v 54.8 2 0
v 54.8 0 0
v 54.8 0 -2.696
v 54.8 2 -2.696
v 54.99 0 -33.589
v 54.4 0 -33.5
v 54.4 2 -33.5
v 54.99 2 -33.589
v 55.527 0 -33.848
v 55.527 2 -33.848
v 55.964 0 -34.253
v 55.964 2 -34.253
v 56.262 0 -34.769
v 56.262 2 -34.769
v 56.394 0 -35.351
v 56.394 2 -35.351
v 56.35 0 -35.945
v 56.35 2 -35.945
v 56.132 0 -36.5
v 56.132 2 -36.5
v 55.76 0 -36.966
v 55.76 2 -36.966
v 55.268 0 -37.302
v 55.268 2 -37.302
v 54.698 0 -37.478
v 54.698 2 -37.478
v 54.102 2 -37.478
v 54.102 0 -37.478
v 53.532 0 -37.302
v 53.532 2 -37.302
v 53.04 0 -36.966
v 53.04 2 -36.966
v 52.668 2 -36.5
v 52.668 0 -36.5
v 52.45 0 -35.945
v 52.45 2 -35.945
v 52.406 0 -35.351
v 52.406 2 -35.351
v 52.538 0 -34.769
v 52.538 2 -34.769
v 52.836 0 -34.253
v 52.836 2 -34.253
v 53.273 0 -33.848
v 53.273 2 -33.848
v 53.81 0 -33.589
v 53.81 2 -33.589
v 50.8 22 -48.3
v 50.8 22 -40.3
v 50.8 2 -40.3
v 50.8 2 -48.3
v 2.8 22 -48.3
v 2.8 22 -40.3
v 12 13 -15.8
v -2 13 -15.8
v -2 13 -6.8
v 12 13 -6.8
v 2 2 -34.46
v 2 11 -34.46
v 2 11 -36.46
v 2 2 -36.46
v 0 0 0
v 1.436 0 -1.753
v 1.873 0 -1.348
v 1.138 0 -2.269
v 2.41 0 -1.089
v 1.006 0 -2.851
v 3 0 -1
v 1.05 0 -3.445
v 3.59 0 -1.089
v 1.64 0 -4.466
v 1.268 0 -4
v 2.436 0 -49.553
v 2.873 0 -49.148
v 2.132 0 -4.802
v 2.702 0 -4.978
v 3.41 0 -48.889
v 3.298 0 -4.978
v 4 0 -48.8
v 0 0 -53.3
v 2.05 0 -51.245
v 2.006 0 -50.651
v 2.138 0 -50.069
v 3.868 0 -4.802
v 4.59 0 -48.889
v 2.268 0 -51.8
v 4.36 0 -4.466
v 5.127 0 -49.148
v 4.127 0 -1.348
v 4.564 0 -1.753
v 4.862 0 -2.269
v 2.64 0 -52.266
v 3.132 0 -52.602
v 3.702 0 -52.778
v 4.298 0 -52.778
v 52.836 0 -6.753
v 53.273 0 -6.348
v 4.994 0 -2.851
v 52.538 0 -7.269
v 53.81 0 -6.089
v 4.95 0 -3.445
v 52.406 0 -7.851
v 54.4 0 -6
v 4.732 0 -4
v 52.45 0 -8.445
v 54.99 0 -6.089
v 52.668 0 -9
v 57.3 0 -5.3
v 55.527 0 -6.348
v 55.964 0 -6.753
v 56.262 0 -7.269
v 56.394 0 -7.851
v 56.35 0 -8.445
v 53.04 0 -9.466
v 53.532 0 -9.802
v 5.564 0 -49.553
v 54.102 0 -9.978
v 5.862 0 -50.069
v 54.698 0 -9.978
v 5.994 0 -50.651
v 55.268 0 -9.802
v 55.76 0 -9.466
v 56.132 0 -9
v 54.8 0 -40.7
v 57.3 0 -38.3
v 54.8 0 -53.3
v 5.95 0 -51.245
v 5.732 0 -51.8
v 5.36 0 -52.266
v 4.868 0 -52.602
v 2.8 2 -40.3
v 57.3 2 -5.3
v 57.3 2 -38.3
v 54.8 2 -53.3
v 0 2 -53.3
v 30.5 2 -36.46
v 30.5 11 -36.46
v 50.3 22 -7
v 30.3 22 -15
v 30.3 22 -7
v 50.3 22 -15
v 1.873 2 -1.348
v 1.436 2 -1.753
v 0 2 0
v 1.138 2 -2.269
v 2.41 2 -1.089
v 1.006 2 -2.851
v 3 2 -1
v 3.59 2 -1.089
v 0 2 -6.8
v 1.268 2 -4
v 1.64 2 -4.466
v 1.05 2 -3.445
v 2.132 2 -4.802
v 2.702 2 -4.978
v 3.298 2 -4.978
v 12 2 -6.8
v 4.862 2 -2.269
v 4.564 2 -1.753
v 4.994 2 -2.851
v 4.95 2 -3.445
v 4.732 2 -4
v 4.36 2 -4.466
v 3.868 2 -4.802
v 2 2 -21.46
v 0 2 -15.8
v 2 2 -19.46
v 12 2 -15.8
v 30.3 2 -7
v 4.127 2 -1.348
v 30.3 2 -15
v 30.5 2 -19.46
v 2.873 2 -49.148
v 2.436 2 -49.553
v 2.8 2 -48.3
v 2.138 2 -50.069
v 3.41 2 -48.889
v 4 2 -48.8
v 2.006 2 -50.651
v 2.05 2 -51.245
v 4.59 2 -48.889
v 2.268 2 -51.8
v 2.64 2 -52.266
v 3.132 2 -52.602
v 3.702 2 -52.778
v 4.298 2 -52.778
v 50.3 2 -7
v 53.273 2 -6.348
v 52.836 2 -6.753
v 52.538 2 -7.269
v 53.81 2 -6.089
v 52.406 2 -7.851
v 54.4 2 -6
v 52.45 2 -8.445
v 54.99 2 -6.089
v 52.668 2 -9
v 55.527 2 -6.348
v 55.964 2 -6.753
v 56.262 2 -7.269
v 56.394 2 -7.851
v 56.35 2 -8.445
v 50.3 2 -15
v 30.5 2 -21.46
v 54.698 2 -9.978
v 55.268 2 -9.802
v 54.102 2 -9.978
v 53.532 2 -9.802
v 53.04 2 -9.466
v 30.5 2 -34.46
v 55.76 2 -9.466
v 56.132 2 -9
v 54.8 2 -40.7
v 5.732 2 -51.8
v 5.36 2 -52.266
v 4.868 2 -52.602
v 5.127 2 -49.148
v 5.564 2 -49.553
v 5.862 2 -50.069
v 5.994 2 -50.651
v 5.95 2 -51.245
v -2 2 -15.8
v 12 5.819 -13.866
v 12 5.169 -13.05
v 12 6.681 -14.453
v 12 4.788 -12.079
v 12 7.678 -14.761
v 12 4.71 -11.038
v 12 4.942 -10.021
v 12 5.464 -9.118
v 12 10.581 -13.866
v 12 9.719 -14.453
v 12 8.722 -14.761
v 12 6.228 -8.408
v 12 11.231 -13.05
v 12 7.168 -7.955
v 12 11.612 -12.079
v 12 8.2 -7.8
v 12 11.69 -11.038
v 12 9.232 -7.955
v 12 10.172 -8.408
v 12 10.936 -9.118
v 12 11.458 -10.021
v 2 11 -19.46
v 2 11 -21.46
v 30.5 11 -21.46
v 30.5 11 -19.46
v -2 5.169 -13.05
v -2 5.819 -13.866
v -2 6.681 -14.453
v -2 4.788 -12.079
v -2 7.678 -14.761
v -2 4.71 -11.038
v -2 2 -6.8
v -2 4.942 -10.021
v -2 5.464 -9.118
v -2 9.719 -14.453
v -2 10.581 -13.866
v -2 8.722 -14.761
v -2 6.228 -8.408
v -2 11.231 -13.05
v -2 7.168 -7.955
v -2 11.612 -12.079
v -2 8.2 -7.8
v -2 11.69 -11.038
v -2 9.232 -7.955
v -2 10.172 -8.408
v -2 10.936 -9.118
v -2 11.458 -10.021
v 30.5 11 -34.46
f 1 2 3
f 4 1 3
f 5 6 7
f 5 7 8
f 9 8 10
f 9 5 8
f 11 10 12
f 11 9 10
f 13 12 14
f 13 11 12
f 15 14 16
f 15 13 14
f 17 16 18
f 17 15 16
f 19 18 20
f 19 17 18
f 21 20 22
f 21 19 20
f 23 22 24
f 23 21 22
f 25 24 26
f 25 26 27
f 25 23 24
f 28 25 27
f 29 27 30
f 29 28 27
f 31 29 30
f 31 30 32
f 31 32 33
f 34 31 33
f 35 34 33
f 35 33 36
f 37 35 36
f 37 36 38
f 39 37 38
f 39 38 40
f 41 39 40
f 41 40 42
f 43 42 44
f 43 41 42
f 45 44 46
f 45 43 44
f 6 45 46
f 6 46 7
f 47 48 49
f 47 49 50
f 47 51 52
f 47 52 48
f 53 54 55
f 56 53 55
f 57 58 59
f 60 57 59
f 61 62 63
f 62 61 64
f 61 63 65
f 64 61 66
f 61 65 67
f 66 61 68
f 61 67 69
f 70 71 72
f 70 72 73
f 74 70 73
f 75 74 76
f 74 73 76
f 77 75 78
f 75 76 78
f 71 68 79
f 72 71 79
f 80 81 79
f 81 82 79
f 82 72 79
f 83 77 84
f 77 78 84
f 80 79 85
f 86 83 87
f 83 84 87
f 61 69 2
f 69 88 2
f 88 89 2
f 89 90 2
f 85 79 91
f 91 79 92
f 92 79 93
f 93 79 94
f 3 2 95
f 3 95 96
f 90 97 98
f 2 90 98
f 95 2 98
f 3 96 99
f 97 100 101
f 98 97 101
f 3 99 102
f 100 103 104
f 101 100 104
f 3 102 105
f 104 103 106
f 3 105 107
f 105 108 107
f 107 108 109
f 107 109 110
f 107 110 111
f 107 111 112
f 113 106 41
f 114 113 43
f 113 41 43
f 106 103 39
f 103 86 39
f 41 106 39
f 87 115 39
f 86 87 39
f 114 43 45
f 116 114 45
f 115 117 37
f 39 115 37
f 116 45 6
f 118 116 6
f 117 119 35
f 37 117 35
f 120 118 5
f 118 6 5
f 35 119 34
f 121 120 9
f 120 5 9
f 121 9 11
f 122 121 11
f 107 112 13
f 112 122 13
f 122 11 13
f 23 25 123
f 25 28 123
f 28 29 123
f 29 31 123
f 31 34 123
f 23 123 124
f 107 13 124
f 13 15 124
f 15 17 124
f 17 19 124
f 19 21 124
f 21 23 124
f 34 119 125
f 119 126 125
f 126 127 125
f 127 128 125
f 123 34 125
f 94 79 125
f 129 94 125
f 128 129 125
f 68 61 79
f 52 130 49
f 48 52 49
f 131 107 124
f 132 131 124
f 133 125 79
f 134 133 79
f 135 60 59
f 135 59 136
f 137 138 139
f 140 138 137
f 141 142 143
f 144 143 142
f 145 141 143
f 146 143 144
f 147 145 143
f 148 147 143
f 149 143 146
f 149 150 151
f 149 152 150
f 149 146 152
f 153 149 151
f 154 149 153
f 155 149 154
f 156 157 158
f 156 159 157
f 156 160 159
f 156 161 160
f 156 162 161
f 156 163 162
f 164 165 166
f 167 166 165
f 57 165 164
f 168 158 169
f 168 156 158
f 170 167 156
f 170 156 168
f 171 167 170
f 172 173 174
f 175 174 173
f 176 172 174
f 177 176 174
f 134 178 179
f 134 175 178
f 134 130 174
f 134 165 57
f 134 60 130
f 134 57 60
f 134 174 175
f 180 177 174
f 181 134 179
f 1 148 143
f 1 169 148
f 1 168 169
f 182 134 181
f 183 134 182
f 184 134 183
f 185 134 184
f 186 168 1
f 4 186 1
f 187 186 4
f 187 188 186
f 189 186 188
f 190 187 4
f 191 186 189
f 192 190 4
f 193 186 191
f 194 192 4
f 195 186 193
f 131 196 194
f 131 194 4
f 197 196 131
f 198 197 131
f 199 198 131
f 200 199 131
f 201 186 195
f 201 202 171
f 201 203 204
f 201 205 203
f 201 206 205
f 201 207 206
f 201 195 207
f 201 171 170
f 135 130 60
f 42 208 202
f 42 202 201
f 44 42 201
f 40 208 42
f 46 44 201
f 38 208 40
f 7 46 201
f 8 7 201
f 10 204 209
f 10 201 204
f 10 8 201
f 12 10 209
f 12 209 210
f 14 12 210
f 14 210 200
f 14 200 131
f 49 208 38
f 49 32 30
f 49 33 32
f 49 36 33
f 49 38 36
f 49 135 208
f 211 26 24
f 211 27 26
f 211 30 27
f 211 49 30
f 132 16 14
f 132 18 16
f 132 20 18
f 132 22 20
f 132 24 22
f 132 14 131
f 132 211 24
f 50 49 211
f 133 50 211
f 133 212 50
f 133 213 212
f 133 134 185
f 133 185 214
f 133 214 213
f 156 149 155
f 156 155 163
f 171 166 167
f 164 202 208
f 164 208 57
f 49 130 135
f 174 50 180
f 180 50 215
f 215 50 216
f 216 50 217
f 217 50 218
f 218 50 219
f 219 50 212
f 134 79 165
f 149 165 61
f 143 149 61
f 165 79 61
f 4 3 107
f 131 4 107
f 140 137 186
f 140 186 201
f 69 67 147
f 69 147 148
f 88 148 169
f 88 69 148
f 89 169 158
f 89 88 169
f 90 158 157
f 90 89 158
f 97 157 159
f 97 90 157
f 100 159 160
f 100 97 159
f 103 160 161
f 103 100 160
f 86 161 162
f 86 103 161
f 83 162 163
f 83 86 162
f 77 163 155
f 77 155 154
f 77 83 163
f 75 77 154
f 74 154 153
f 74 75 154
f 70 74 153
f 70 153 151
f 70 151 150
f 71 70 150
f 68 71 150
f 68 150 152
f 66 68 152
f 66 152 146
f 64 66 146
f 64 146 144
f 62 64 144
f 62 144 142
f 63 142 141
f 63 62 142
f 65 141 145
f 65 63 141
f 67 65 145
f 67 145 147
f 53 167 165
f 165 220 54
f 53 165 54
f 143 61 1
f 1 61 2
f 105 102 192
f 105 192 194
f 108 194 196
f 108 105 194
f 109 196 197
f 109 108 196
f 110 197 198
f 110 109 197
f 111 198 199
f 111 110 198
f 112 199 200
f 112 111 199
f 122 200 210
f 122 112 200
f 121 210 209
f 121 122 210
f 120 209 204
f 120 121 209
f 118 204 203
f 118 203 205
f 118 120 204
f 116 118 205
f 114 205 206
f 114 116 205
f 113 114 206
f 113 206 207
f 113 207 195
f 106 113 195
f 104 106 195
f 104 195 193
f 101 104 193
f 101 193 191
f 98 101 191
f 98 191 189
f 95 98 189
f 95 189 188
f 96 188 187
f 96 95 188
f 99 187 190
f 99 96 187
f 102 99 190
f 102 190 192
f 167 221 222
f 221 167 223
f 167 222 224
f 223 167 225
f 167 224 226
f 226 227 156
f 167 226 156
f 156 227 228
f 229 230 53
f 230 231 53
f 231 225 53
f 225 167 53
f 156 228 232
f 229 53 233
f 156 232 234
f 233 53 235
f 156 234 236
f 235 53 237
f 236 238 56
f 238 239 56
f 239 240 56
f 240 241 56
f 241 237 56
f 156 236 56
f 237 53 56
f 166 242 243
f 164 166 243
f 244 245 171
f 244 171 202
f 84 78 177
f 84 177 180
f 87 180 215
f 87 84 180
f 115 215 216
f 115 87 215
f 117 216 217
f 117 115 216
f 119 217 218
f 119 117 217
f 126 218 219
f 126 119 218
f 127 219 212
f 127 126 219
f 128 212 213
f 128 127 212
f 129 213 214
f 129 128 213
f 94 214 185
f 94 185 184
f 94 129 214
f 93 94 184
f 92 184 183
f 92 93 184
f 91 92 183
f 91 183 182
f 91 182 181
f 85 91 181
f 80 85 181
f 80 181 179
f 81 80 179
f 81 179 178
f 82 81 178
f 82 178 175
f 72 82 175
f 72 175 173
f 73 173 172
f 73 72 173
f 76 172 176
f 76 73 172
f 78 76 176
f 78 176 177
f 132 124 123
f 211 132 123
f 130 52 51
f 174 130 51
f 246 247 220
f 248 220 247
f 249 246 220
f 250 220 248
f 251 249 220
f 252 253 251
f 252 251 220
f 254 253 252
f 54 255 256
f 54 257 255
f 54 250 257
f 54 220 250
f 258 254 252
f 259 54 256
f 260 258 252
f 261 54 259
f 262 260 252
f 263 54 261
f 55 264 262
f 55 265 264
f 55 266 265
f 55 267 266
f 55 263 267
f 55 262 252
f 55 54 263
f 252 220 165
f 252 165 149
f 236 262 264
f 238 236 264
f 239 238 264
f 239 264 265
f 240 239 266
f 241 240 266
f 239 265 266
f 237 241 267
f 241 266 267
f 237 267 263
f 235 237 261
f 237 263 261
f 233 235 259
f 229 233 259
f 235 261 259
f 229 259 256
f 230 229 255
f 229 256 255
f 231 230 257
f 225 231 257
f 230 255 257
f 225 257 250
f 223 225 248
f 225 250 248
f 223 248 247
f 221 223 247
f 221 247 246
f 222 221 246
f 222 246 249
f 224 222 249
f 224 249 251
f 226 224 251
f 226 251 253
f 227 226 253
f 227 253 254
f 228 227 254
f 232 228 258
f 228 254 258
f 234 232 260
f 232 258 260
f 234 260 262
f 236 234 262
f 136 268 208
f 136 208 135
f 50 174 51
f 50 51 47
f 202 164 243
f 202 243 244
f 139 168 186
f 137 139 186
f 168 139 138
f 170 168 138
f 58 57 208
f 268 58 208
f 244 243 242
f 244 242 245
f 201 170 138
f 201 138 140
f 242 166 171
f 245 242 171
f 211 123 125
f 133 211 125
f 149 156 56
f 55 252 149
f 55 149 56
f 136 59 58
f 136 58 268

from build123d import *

# Parameters (mm, degrees)
SKETCH1_R           = 2
BOSS_EXTRUDE1_DEPTH = 2
SKETCH2_W           = 28.5
SKETCH2_H           = 2
BOSS_EXTRUDE2_DEPTH = 9
LPATTERN1_COUNT     = 2
LPATTERN1_PITCH     = 15
SKETCH3_W           = 20
SKETCH3_H           = 8
BOSS_EXTRUDE3_DEPTH = 20
SKETCH4_W           = 48
SKETCH4_H           = 8
BOSS_EXTRUDE4_DEPTH = 20
SKETCH5_W           = 9
SKETCH5_H           = 11
SKETCH5_R           = 3.5
BOSS_EXTRUDE5_DEPTH = 14


with BuildPart() as part:
    # Sketch1 → Boss-Extrude1 (new body)
    with BuildSketch(Plane(origin=(0, 0, 0), x_dir=(1, 0, 0), z_dir=(0, 1, 0))):
        Polygon((54.8, 40.7), (54.8, 53.3), (0, 53.3), (0, 0), (54.8, 0), (54.8, 2.695833333), (57.3, 5.3), (57.3, 38.3), align=None)
        with Locations(Location((3, 3, 0), (0, 0, 270))):
            Circle(SKETCH1_R, mode=Mode.SUBTRACT)
        with Locations(Location((54.4, 8, 0), (0, 0, 270))):
            Circle(SKETCH1_R, mode=Mode.SUBTRACT)
        with Locations(Location((4, 50.8, 0), (0, 0, 270))):
            Circle(SKETCH1_R, mode=Mode.SUBTRACT)
        with Locations(Location((54.4, 35.5, 0), (0, 0, 270))):
            Circle(SKETCH1_R, mode=Mode.SUBTRACT)
    extrude(amount=BOSS_EXTRUDE1_DEPTH)

    # Sketch2 → Boss-Extrude2 (add)
    with BuildSketch(Plane(origin=(0, 2, 0), x_dir=(1, 0, 0), z_dir=(0, 1, 0))):
        with Locations((16.25, 35.460185898)):
            Rectangle(SKETCH2_W, SKETCH2_H)
    boss_extrude2 = extrude(amount=BOSS_EXTRUDE2_DEPTH)

    # LPattern1: Boss-Extrude2 ×2
    with Locations(*[(0, 0, i * LPATTERN1_PITCH) for i in range(1, LPATTERN1_COUNT)]):
        add(boss_extrude2)

    # Sketch3 → Boss-Extrude3 (add)
    with BuildSketch(Plane(origin=(0, 2, 0), x_dir=(1, 0, 0), z_dir=(0, 1, 0))):
        with Locations((40.3, 11)):
            Rectangle(SKETCH3_W, SKETCH3_H)
    extrude(amount=BOSS_EXTRUDE3_DEPTH)

    # Sketch4 → Boss-Extrude4 (add)
    with BuildSketch(Plane(origin=(0, 2, 0), x_dir=(1, 0, 0), z_dir=(0, 1, 0))):
        with Locations((26.8, 44.3)):
            Rectangle(SKETCH4_W, SKETCH4_H)
    extrude(amount=BOSS_EXTRUDE4_DEPTH)

    # Sketch5 → Boss-Extrude5 (add)
    with BuildSketch(Plane.ZY.offset(2)):
        with Locations((-11.3, 7.5)):
            Rectangle(SKETCH5_W, SKETCH5_H)
        with Locations((-11.3, 8.2)):
            Circle(SKETCH5_R, mode=Mode.SUBTRACT)
    extrude(amount=-BOSS_EXTRUDE5_DEPTH)


solid = part.part
